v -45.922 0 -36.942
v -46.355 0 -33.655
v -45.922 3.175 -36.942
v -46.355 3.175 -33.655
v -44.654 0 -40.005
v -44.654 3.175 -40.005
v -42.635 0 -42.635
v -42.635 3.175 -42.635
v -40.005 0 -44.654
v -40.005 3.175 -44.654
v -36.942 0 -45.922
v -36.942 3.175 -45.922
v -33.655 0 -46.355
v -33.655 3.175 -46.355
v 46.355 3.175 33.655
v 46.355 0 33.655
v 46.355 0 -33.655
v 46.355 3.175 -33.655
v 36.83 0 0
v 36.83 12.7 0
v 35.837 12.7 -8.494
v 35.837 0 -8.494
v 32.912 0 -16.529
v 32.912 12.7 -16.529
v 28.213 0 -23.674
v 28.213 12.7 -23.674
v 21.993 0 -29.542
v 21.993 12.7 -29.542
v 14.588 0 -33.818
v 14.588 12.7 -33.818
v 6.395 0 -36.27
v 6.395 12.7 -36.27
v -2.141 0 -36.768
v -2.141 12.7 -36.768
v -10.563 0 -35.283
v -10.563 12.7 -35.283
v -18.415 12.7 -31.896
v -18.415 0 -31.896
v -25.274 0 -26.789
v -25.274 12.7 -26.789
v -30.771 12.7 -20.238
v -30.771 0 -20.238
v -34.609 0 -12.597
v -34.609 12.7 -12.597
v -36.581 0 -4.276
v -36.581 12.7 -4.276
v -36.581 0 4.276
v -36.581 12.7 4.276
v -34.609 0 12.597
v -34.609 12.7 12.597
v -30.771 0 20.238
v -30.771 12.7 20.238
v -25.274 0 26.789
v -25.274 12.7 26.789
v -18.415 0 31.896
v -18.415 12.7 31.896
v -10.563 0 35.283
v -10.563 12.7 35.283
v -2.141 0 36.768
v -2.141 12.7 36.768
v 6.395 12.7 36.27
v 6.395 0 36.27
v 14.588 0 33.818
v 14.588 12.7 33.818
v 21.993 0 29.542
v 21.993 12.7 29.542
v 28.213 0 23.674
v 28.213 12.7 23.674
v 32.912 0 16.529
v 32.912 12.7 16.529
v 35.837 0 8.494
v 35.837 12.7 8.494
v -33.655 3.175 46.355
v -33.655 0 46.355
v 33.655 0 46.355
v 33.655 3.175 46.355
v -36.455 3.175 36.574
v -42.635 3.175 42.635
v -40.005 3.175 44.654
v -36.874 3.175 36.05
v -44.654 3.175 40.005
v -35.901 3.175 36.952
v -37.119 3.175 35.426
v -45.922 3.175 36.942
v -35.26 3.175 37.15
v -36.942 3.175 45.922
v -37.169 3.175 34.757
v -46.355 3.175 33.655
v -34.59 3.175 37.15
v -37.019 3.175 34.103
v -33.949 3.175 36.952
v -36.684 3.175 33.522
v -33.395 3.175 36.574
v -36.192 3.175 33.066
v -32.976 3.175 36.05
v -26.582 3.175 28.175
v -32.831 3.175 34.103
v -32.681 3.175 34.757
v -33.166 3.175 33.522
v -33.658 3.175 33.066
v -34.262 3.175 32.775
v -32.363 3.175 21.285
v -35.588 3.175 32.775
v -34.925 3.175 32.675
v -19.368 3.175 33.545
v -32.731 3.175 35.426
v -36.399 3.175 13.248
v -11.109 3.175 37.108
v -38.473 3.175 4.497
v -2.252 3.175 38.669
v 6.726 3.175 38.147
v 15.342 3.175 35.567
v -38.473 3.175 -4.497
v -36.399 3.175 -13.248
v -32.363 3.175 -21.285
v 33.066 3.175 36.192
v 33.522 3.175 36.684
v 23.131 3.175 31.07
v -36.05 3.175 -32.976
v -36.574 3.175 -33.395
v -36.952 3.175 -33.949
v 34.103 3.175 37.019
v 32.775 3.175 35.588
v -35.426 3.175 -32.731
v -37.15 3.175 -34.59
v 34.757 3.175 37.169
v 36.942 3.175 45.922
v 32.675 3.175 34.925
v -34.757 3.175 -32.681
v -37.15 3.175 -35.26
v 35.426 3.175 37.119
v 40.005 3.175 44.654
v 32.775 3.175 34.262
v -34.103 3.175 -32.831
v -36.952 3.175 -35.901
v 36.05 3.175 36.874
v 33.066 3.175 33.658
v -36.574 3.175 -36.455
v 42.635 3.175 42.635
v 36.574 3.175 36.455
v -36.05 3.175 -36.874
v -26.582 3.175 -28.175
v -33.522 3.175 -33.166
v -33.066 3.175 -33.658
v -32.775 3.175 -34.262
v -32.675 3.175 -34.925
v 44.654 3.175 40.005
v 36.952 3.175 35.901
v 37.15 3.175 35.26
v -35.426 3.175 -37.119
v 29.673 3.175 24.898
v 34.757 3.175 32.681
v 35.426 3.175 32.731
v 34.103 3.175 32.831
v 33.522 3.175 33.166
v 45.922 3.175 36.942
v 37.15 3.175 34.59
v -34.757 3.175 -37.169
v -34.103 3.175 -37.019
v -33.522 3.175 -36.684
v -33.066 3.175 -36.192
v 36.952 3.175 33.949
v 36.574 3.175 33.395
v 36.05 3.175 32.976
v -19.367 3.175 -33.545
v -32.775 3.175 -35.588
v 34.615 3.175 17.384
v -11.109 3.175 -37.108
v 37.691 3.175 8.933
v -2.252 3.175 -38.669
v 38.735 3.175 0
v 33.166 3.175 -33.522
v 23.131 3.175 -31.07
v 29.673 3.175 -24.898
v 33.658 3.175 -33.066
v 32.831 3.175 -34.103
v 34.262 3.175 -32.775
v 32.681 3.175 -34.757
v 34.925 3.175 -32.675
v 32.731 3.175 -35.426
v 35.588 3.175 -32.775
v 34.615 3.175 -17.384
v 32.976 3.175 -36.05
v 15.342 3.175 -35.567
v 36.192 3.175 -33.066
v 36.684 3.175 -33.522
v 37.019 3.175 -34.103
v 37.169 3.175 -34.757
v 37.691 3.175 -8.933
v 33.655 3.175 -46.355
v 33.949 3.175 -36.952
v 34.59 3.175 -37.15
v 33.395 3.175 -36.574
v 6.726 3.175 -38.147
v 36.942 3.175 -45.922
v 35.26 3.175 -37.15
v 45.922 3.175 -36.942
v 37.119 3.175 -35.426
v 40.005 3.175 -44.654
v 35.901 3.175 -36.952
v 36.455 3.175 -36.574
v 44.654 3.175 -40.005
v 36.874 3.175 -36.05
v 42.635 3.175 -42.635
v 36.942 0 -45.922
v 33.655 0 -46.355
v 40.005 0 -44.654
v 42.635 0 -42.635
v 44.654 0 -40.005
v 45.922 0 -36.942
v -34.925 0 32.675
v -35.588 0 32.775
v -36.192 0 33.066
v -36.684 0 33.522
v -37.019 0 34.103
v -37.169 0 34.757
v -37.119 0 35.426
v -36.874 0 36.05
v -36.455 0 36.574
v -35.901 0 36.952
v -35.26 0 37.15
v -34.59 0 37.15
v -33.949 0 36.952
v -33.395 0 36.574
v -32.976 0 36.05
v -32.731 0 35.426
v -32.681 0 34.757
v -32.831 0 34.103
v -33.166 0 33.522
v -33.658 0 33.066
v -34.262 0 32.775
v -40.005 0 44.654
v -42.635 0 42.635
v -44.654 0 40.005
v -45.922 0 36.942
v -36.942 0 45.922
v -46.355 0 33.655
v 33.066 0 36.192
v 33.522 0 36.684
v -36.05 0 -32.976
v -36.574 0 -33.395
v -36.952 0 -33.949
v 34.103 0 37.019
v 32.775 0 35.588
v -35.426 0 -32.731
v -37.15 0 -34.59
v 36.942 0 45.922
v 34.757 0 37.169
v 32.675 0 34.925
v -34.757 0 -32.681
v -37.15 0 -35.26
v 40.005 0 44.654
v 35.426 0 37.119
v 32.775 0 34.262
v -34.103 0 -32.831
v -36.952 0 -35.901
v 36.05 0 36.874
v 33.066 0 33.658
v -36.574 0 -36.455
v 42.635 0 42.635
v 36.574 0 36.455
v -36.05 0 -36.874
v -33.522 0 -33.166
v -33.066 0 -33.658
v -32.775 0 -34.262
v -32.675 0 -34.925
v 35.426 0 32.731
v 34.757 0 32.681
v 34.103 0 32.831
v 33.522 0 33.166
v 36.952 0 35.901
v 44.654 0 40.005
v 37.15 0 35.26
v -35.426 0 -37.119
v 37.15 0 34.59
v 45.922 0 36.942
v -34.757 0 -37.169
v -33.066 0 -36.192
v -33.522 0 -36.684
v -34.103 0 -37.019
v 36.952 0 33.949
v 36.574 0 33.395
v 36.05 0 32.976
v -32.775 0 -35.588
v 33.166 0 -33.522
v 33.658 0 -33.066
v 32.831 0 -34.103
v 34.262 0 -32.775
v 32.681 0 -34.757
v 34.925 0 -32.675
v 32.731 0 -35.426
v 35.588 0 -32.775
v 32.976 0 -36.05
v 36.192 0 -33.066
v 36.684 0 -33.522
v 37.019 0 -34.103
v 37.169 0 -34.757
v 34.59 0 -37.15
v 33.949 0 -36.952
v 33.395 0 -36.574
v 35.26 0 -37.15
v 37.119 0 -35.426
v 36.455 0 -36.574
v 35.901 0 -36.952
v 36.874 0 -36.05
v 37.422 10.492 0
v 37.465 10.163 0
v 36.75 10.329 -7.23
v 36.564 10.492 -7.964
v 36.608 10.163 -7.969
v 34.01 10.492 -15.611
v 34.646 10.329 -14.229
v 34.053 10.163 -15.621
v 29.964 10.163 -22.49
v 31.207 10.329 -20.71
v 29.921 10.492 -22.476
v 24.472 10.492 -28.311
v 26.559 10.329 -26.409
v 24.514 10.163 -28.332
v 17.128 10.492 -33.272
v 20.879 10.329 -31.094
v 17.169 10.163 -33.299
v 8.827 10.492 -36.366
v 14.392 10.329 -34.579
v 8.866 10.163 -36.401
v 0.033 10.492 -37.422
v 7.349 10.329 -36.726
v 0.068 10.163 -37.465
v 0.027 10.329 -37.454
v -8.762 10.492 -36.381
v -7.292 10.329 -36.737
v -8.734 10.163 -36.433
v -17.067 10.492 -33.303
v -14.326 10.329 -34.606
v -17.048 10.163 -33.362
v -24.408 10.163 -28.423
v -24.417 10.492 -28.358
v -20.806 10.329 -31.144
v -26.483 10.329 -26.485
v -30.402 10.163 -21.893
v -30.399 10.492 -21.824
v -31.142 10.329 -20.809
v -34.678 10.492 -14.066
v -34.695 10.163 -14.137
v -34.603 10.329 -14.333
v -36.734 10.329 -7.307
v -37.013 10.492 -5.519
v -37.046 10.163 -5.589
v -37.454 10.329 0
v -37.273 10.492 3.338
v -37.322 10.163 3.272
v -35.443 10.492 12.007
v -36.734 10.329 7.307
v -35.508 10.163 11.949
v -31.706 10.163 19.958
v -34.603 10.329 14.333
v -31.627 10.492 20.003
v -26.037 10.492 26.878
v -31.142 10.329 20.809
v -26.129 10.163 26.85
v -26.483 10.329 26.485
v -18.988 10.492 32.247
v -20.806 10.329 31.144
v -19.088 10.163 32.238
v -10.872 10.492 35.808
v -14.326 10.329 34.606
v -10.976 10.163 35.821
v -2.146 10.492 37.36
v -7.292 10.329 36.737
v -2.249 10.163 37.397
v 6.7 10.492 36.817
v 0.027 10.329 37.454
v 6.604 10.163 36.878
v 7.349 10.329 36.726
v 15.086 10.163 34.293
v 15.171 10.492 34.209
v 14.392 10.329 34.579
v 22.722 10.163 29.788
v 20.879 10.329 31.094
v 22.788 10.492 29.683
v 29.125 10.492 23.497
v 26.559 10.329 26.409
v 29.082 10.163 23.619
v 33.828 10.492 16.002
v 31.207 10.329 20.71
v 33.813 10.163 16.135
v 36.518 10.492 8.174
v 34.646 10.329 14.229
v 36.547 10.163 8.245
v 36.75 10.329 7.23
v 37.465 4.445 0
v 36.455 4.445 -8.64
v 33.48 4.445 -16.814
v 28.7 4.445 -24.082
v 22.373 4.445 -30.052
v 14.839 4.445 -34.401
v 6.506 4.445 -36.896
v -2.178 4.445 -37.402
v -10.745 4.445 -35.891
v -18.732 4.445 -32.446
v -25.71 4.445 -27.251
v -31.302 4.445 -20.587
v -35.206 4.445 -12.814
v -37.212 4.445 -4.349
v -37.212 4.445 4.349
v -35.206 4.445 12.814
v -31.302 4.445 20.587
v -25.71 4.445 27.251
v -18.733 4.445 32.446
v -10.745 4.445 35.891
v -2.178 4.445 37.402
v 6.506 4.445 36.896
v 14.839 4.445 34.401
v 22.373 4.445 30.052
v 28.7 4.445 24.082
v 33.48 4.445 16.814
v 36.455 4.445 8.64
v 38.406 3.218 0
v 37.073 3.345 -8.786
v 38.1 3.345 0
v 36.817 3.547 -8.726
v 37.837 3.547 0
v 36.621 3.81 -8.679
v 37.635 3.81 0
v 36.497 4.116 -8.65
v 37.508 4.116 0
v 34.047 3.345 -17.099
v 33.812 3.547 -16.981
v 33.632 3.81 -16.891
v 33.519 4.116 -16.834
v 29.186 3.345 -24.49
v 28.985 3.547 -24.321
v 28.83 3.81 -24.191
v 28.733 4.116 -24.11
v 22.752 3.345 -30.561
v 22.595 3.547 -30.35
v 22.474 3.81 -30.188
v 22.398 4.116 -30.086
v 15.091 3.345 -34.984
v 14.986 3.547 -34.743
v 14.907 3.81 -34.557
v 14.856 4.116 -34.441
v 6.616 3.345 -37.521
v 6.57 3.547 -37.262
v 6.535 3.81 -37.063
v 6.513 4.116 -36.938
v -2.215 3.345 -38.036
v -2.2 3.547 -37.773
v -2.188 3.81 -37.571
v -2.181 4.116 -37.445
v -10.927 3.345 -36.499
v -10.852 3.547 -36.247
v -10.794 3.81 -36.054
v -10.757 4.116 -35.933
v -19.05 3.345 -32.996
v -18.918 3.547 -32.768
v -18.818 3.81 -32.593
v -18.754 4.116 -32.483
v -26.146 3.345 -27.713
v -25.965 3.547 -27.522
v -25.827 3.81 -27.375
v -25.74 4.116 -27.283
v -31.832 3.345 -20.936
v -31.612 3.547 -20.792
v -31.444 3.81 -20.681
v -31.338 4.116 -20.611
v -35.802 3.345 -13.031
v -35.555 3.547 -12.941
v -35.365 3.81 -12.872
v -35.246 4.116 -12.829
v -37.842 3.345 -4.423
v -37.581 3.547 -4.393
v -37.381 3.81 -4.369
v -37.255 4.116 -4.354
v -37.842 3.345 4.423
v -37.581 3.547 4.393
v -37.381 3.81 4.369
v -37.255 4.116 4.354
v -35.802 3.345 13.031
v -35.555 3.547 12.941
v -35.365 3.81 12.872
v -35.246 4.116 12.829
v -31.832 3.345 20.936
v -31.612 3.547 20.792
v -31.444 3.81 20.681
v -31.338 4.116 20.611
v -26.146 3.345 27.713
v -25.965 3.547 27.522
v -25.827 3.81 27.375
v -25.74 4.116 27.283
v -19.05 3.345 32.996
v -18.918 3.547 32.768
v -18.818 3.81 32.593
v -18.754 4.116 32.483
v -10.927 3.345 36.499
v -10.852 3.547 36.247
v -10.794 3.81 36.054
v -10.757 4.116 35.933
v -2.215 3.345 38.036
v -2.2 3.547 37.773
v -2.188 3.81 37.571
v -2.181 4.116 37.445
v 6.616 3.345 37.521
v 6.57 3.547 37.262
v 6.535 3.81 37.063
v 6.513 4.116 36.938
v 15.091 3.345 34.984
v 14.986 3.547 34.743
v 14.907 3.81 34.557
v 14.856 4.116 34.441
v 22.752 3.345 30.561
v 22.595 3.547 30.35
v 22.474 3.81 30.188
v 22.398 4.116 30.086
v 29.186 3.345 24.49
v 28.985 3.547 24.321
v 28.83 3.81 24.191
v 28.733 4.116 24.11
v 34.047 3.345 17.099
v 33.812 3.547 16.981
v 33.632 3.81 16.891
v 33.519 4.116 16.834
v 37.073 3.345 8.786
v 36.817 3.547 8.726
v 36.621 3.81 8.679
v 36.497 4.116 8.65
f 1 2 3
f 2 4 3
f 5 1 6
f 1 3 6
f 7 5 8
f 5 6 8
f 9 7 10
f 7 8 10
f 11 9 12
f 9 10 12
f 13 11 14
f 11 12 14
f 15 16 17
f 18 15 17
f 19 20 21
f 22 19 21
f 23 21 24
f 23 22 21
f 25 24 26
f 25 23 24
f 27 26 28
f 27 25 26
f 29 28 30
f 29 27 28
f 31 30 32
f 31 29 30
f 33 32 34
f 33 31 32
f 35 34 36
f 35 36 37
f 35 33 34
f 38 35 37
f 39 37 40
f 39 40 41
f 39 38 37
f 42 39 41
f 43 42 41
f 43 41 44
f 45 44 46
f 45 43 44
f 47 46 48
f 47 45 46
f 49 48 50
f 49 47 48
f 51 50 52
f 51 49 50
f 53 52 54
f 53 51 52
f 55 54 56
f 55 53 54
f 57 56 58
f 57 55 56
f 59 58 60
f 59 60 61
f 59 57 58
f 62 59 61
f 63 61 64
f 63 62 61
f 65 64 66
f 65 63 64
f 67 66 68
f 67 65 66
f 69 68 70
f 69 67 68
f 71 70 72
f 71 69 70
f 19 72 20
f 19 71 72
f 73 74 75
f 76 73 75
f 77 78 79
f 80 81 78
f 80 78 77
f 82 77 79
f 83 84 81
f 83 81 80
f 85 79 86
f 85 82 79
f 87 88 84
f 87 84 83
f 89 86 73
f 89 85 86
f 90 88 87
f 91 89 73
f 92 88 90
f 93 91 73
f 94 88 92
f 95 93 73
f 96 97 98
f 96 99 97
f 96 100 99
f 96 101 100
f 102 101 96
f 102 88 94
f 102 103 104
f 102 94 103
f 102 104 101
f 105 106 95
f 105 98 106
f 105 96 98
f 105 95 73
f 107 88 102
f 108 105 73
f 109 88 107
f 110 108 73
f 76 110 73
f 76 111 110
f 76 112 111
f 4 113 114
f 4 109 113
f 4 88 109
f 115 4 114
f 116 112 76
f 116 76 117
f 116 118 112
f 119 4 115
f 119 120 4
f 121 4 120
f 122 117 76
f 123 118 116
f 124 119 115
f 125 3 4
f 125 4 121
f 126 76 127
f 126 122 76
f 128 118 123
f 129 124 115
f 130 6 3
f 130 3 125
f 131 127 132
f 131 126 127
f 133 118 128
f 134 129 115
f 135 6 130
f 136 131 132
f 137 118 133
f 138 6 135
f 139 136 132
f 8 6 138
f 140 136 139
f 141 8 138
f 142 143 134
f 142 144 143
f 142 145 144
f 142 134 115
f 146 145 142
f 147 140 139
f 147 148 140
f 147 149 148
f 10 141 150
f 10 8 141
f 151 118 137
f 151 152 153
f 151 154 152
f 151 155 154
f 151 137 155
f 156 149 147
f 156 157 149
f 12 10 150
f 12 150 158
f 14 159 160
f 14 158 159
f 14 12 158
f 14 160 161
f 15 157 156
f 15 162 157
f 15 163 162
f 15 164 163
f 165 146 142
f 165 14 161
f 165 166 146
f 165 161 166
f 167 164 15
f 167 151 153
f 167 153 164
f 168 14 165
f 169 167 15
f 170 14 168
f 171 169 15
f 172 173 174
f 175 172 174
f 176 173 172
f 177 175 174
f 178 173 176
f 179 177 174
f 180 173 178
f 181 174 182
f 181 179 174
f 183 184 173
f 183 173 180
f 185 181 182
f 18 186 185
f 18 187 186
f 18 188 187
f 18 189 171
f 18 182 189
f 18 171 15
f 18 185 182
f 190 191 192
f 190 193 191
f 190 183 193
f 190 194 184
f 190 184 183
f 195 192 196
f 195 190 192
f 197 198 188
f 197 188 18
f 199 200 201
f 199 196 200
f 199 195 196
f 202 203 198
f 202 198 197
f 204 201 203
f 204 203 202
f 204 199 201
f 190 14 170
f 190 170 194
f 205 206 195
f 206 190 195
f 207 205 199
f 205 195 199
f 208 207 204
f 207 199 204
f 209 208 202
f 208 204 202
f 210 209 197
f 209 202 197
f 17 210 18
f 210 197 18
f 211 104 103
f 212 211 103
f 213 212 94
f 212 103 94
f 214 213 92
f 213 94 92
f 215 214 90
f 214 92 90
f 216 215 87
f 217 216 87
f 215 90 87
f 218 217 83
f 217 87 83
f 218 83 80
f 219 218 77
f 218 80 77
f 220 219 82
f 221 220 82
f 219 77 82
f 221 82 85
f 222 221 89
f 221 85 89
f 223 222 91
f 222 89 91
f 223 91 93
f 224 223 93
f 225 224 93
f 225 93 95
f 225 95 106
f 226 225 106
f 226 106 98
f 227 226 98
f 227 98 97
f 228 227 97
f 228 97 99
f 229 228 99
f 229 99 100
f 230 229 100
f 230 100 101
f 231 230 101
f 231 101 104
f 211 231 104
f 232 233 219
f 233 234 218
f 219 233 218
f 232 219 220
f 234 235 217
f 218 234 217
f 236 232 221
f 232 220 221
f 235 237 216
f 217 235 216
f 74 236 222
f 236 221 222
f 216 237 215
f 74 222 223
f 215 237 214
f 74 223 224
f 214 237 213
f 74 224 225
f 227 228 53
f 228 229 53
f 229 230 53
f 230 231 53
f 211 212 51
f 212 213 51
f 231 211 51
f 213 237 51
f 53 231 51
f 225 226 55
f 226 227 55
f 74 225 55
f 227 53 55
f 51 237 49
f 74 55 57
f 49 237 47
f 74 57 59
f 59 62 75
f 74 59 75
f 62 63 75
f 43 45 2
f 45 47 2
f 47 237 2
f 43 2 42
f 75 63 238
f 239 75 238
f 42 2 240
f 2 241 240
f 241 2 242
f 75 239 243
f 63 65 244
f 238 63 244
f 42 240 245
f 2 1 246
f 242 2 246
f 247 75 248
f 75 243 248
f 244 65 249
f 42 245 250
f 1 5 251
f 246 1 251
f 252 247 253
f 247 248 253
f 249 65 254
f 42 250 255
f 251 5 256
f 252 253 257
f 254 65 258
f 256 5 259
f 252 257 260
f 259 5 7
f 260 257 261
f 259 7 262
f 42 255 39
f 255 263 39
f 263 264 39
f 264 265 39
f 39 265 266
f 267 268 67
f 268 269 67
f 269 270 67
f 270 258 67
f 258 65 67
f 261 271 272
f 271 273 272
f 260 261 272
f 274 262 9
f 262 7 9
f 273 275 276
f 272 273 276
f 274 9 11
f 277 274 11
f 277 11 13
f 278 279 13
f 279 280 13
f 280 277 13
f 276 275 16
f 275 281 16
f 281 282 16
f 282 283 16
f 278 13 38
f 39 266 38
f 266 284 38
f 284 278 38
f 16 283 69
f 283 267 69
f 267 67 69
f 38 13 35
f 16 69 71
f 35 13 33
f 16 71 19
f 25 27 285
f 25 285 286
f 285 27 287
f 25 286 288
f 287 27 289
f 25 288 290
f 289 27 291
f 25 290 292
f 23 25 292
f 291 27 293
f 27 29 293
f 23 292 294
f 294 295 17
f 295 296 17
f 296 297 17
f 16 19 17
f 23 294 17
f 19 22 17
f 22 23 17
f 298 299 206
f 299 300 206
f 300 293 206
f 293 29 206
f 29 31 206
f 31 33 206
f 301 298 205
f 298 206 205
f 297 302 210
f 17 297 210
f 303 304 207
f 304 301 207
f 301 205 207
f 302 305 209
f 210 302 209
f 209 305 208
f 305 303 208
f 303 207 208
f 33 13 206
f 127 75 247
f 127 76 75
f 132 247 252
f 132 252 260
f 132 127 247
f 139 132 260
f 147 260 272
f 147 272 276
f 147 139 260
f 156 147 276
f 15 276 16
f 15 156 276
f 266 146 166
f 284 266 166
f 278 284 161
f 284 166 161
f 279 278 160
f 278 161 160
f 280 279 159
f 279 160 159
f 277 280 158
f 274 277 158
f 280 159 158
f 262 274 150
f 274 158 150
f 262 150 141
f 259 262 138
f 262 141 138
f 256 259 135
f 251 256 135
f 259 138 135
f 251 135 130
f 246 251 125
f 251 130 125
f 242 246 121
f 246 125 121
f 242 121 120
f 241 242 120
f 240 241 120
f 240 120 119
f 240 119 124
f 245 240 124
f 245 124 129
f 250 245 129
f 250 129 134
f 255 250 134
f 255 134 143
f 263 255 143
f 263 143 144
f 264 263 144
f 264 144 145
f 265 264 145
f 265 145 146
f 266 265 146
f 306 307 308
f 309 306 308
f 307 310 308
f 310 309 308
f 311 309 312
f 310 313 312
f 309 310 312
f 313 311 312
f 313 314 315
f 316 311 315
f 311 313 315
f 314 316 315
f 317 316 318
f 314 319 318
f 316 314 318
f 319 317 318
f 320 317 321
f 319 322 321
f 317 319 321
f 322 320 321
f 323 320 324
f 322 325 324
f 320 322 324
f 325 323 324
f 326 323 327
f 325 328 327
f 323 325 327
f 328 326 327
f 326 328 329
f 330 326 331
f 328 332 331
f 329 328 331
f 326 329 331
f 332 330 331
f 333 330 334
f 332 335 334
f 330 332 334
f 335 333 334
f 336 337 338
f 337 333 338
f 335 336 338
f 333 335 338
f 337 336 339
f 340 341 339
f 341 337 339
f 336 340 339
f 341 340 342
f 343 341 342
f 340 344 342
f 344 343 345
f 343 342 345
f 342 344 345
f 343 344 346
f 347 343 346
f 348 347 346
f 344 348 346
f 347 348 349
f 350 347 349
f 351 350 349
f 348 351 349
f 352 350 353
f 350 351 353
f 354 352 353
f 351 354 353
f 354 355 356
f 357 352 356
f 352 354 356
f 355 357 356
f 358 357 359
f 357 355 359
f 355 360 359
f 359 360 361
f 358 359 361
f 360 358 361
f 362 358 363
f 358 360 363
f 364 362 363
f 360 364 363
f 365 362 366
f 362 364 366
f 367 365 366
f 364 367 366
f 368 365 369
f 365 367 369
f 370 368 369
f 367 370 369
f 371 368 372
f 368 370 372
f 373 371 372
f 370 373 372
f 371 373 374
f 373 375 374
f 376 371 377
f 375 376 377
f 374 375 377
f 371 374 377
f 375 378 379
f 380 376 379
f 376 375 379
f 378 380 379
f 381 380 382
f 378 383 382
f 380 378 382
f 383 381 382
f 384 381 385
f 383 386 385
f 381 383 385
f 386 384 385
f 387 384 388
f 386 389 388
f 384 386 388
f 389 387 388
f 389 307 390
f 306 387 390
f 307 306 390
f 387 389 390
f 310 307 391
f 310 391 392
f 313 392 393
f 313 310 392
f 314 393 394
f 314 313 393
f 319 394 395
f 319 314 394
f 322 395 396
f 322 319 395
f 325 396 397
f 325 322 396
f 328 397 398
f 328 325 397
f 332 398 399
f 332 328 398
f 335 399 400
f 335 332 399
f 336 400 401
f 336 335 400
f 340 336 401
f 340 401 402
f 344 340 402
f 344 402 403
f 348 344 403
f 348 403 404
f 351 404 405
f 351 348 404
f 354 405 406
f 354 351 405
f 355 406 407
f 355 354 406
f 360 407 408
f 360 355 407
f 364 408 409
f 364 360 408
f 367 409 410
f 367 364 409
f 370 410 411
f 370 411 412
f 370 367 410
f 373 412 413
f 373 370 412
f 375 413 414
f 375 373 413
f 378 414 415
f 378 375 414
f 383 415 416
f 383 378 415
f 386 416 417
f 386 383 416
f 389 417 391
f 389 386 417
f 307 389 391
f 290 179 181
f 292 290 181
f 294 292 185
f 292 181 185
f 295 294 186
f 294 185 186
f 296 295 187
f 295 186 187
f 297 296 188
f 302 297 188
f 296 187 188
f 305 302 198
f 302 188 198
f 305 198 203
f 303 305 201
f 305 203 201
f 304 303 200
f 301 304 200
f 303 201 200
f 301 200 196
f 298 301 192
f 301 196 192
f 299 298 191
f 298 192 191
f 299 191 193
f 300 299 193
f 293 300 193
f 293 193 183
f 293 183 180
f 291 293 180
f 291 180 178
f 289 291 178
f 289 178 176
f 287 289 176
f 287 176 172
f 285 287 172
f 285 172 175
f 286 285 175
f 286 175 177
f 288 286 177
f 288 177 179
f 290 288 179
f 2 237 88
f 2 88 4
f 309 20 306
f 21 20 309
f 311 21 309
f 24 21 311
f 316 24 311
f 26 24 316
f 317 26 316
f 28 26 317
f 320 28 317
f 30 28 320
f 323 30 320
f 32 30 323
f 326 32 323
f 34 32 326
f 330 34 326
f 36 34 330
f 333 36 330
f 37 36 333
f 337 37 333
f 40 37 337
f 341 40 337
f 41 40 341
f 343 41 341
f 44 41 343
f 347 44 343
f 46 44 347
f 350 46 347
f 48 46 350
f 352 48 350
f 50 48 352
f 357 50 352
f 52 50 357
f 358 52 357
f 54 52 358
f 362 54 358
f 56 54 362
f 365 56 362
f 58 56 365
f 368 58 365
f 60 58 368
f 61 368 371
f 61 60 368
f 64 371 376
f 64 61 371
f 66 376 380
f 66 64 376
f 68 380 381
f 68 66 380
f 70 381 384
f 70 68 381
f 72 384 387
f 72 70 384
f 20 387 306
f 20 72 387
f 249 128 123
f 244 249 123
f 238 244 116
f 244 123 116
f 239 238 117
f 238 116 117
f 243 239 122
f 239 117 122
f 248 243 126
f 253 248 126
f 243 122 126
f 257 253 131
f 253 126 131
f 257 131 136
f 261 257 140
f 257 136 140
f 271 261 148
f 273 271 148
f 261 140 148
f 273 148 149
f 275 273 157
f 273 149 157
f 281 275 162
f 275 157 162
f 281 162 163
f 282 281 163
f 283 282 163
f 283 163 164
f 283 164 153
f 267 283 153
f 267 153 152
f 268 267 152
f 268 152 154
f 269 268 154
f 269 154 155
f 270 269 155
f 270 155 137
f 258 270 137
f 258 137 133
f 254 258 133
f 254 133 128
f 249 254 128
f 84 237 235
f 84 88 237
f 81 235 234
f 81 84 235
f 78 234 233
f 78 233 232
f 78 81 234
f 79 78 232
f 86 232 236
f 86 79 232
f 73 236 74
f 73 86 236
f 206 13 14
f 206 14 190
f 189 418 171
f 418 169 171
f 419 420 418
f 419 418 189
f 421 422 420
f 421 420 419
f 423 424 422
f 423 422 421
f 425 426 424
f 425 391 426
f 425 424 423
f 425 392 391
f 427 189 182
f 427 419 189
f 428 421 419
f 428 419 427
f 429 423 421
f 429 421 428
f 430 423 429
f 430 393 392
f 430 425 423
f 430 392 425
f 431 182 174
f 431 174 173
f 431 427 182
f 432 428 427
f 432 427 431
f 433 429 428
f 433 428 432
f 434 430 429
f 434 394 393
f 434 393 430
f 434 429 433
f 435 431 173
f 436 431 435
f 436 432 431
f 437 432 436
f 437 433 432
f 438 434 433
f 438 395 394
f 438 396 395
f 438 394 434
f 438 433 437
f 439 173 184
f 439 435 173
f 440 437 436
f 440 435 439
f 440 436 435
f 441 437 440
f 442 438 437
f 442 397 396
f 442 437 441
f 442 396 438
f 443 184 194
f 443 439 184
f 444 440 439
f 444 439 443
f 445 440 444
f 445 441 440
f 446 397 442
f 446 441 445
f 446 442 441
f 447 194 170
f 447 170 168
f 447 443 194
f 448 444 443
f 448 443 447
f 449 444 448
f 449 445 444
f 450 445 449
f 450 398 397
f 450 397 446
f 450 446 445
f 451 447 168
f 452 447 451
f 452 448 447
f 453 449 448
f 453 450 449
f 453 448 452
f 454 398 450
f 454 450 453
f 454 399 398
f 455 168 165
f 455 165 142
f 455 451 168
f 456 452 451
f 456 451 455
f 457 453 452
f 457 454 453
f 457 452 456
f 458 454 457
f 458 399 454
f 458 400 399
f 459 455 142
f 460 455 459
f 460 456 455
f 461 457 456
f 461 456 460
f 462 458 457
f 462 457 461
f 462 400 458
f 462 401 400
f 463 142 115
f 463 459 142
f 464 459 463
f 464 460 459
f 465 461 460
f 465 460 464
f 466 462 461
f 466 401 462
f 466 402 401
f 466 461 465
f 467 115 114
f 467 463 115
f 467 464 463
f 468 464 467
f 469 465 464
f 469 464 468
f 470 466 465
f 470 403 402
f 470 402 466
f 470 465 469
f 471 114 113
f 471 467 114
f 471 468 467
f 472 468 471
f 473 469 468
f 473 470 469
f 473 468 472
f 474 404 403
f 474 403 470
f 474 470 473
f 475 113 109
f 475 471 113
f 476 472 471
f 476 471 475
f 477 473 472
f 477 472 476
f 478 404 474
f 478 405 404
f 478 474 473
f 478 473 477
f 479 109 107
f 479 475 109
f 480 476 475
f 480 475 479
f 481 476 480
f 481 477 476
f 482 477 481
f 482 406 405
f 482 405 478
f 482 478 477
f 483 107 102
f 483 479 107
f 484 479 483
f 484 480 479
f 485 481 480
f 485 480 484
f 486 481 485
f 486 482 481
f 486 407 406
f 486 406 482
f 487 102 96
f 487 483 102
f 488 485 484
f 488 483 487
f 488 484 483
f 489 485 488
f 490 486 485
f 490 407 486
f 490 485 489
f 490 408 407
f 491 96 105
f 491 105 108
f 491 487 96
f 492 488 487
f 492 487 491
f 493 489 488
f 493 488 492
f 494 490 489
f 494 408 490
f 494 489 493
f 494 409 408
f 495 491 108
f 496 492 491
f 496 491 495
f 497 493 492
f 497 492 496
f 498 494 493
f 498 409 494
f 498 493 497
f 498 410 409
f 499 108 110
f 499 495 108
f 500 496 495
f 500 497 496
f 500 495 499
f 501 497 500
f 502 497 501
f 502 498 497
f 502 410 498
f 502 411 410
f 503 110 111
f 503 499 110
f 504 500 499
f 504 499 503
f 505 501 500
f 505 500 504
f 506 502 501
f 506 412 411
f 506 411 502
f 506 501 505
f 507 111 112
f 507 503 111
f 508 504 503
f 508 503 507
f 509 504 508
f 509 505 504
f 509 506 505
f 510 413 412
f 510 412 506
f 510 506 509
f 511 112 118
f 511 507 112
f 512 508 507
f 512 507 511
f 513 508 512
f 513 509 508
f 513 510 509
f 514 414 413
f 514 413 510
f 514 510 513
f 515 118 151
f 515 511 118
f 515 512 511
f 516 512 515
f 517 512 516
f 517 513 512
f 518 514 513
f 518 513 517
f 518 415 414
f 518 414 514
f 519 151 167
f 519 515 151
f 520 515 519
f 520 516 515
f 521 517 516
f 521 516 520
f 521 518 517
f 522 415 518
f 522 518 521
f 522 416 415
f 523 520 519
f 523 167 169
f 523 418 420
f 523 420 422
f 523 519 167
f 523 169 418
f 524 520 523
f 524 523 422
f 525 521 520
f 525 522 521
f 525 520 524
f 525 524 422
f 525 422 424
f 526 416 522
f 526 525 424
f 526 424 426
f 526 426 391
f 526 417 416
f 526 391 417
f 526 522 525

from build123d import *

# Parameters (mm, degrees)
SKETCH1_W           = 92.71
SKETCH1_H           = 92.71
SKETCH1_R           = 36.83
BOSS_EXTRUDE1_DEPTH = 3.175
SKETCH2_R           = 2.25
CUT_EXTRUDE1_DEPTH  = 4.175
CIRPATTERN1_COUNT   = 4
FILLET1_R           = 12.7
FILLET2_R           = 1.27


with BuildPart() as part:
    # Sketch1 → Boss-Extrude1 (new body)
    with BuildSketch(Plane(origin=(0, 0, 0), x_dir=(1, 0, 0), z_dir=(0, 1, 0))):
        Rectangle(SKETCH1_W, SKETCH1_H)
        Circle(SKETCH1_R, mode=Mode.SUBTRACT)
    extrude(amount=BOSS_EXTRUDE1_DEPTH)

    # Sketch2 → Cut-Extrude1 (cut, through all)
    with BuildSketch(Plane(origin=(0, 3.175, 0), x_dir=(1, 0, 0), z_dir=(0, 1, 0))):
        with Locations((-34.925, 34.925)):
            Circle(SKETCH2_R)
    cut_extrude1 = extrude(amount=-CUT_EXTRUDE1_DEPTH, mode=Mode.SUBTRACT)

    # CirPattern1: Cut-Extrude1 ×4 about axis
    cirpattern1_axis = Axis((0, 0, 0), (0, 1, 0))
    for i in range(1, CIRPATTERN1_COUNT):
        add(cut_extrude1.rotate(cirpattern1_axis, i * 360 / CIRPATTERN1_COUNT), mode=Mode.SUBTRACT)

    # Fillet1
    fillet1_edges = [part.edges().sort_by_distance(p)[0] for p in [
        (-46.355, 1.5875, -46.355),
        (46.355, 1.5875, -46.355),
        (46.355, 1.5875, 46.355),
        (-46.355, 1.5875, 46.355),
    ]]
    fillet(fillet1_edges, radius=FILLET1_R)

    # Sketch4 → Revolve1 (revolve)
    with BuildSketch(Plane.XY):
        Polygon((36.83, 12.7), (36.83, 3.175), (37.465, 3.175), (37.465, 10.330147737), align=None)
    revolve(axis=Axis((0, -1000, 0), (0, 1, 0)))

    # Fillet2
    fillet2_edges = [part.edges().sort_by_distance(p)[0] for p in [
        (-37.465, 3.175, 0),
        (-37.465, 10.330147737, 0),
    ]]
    fillet(fillet2_edges, radius=FILLET2_R)


solid = part.part
